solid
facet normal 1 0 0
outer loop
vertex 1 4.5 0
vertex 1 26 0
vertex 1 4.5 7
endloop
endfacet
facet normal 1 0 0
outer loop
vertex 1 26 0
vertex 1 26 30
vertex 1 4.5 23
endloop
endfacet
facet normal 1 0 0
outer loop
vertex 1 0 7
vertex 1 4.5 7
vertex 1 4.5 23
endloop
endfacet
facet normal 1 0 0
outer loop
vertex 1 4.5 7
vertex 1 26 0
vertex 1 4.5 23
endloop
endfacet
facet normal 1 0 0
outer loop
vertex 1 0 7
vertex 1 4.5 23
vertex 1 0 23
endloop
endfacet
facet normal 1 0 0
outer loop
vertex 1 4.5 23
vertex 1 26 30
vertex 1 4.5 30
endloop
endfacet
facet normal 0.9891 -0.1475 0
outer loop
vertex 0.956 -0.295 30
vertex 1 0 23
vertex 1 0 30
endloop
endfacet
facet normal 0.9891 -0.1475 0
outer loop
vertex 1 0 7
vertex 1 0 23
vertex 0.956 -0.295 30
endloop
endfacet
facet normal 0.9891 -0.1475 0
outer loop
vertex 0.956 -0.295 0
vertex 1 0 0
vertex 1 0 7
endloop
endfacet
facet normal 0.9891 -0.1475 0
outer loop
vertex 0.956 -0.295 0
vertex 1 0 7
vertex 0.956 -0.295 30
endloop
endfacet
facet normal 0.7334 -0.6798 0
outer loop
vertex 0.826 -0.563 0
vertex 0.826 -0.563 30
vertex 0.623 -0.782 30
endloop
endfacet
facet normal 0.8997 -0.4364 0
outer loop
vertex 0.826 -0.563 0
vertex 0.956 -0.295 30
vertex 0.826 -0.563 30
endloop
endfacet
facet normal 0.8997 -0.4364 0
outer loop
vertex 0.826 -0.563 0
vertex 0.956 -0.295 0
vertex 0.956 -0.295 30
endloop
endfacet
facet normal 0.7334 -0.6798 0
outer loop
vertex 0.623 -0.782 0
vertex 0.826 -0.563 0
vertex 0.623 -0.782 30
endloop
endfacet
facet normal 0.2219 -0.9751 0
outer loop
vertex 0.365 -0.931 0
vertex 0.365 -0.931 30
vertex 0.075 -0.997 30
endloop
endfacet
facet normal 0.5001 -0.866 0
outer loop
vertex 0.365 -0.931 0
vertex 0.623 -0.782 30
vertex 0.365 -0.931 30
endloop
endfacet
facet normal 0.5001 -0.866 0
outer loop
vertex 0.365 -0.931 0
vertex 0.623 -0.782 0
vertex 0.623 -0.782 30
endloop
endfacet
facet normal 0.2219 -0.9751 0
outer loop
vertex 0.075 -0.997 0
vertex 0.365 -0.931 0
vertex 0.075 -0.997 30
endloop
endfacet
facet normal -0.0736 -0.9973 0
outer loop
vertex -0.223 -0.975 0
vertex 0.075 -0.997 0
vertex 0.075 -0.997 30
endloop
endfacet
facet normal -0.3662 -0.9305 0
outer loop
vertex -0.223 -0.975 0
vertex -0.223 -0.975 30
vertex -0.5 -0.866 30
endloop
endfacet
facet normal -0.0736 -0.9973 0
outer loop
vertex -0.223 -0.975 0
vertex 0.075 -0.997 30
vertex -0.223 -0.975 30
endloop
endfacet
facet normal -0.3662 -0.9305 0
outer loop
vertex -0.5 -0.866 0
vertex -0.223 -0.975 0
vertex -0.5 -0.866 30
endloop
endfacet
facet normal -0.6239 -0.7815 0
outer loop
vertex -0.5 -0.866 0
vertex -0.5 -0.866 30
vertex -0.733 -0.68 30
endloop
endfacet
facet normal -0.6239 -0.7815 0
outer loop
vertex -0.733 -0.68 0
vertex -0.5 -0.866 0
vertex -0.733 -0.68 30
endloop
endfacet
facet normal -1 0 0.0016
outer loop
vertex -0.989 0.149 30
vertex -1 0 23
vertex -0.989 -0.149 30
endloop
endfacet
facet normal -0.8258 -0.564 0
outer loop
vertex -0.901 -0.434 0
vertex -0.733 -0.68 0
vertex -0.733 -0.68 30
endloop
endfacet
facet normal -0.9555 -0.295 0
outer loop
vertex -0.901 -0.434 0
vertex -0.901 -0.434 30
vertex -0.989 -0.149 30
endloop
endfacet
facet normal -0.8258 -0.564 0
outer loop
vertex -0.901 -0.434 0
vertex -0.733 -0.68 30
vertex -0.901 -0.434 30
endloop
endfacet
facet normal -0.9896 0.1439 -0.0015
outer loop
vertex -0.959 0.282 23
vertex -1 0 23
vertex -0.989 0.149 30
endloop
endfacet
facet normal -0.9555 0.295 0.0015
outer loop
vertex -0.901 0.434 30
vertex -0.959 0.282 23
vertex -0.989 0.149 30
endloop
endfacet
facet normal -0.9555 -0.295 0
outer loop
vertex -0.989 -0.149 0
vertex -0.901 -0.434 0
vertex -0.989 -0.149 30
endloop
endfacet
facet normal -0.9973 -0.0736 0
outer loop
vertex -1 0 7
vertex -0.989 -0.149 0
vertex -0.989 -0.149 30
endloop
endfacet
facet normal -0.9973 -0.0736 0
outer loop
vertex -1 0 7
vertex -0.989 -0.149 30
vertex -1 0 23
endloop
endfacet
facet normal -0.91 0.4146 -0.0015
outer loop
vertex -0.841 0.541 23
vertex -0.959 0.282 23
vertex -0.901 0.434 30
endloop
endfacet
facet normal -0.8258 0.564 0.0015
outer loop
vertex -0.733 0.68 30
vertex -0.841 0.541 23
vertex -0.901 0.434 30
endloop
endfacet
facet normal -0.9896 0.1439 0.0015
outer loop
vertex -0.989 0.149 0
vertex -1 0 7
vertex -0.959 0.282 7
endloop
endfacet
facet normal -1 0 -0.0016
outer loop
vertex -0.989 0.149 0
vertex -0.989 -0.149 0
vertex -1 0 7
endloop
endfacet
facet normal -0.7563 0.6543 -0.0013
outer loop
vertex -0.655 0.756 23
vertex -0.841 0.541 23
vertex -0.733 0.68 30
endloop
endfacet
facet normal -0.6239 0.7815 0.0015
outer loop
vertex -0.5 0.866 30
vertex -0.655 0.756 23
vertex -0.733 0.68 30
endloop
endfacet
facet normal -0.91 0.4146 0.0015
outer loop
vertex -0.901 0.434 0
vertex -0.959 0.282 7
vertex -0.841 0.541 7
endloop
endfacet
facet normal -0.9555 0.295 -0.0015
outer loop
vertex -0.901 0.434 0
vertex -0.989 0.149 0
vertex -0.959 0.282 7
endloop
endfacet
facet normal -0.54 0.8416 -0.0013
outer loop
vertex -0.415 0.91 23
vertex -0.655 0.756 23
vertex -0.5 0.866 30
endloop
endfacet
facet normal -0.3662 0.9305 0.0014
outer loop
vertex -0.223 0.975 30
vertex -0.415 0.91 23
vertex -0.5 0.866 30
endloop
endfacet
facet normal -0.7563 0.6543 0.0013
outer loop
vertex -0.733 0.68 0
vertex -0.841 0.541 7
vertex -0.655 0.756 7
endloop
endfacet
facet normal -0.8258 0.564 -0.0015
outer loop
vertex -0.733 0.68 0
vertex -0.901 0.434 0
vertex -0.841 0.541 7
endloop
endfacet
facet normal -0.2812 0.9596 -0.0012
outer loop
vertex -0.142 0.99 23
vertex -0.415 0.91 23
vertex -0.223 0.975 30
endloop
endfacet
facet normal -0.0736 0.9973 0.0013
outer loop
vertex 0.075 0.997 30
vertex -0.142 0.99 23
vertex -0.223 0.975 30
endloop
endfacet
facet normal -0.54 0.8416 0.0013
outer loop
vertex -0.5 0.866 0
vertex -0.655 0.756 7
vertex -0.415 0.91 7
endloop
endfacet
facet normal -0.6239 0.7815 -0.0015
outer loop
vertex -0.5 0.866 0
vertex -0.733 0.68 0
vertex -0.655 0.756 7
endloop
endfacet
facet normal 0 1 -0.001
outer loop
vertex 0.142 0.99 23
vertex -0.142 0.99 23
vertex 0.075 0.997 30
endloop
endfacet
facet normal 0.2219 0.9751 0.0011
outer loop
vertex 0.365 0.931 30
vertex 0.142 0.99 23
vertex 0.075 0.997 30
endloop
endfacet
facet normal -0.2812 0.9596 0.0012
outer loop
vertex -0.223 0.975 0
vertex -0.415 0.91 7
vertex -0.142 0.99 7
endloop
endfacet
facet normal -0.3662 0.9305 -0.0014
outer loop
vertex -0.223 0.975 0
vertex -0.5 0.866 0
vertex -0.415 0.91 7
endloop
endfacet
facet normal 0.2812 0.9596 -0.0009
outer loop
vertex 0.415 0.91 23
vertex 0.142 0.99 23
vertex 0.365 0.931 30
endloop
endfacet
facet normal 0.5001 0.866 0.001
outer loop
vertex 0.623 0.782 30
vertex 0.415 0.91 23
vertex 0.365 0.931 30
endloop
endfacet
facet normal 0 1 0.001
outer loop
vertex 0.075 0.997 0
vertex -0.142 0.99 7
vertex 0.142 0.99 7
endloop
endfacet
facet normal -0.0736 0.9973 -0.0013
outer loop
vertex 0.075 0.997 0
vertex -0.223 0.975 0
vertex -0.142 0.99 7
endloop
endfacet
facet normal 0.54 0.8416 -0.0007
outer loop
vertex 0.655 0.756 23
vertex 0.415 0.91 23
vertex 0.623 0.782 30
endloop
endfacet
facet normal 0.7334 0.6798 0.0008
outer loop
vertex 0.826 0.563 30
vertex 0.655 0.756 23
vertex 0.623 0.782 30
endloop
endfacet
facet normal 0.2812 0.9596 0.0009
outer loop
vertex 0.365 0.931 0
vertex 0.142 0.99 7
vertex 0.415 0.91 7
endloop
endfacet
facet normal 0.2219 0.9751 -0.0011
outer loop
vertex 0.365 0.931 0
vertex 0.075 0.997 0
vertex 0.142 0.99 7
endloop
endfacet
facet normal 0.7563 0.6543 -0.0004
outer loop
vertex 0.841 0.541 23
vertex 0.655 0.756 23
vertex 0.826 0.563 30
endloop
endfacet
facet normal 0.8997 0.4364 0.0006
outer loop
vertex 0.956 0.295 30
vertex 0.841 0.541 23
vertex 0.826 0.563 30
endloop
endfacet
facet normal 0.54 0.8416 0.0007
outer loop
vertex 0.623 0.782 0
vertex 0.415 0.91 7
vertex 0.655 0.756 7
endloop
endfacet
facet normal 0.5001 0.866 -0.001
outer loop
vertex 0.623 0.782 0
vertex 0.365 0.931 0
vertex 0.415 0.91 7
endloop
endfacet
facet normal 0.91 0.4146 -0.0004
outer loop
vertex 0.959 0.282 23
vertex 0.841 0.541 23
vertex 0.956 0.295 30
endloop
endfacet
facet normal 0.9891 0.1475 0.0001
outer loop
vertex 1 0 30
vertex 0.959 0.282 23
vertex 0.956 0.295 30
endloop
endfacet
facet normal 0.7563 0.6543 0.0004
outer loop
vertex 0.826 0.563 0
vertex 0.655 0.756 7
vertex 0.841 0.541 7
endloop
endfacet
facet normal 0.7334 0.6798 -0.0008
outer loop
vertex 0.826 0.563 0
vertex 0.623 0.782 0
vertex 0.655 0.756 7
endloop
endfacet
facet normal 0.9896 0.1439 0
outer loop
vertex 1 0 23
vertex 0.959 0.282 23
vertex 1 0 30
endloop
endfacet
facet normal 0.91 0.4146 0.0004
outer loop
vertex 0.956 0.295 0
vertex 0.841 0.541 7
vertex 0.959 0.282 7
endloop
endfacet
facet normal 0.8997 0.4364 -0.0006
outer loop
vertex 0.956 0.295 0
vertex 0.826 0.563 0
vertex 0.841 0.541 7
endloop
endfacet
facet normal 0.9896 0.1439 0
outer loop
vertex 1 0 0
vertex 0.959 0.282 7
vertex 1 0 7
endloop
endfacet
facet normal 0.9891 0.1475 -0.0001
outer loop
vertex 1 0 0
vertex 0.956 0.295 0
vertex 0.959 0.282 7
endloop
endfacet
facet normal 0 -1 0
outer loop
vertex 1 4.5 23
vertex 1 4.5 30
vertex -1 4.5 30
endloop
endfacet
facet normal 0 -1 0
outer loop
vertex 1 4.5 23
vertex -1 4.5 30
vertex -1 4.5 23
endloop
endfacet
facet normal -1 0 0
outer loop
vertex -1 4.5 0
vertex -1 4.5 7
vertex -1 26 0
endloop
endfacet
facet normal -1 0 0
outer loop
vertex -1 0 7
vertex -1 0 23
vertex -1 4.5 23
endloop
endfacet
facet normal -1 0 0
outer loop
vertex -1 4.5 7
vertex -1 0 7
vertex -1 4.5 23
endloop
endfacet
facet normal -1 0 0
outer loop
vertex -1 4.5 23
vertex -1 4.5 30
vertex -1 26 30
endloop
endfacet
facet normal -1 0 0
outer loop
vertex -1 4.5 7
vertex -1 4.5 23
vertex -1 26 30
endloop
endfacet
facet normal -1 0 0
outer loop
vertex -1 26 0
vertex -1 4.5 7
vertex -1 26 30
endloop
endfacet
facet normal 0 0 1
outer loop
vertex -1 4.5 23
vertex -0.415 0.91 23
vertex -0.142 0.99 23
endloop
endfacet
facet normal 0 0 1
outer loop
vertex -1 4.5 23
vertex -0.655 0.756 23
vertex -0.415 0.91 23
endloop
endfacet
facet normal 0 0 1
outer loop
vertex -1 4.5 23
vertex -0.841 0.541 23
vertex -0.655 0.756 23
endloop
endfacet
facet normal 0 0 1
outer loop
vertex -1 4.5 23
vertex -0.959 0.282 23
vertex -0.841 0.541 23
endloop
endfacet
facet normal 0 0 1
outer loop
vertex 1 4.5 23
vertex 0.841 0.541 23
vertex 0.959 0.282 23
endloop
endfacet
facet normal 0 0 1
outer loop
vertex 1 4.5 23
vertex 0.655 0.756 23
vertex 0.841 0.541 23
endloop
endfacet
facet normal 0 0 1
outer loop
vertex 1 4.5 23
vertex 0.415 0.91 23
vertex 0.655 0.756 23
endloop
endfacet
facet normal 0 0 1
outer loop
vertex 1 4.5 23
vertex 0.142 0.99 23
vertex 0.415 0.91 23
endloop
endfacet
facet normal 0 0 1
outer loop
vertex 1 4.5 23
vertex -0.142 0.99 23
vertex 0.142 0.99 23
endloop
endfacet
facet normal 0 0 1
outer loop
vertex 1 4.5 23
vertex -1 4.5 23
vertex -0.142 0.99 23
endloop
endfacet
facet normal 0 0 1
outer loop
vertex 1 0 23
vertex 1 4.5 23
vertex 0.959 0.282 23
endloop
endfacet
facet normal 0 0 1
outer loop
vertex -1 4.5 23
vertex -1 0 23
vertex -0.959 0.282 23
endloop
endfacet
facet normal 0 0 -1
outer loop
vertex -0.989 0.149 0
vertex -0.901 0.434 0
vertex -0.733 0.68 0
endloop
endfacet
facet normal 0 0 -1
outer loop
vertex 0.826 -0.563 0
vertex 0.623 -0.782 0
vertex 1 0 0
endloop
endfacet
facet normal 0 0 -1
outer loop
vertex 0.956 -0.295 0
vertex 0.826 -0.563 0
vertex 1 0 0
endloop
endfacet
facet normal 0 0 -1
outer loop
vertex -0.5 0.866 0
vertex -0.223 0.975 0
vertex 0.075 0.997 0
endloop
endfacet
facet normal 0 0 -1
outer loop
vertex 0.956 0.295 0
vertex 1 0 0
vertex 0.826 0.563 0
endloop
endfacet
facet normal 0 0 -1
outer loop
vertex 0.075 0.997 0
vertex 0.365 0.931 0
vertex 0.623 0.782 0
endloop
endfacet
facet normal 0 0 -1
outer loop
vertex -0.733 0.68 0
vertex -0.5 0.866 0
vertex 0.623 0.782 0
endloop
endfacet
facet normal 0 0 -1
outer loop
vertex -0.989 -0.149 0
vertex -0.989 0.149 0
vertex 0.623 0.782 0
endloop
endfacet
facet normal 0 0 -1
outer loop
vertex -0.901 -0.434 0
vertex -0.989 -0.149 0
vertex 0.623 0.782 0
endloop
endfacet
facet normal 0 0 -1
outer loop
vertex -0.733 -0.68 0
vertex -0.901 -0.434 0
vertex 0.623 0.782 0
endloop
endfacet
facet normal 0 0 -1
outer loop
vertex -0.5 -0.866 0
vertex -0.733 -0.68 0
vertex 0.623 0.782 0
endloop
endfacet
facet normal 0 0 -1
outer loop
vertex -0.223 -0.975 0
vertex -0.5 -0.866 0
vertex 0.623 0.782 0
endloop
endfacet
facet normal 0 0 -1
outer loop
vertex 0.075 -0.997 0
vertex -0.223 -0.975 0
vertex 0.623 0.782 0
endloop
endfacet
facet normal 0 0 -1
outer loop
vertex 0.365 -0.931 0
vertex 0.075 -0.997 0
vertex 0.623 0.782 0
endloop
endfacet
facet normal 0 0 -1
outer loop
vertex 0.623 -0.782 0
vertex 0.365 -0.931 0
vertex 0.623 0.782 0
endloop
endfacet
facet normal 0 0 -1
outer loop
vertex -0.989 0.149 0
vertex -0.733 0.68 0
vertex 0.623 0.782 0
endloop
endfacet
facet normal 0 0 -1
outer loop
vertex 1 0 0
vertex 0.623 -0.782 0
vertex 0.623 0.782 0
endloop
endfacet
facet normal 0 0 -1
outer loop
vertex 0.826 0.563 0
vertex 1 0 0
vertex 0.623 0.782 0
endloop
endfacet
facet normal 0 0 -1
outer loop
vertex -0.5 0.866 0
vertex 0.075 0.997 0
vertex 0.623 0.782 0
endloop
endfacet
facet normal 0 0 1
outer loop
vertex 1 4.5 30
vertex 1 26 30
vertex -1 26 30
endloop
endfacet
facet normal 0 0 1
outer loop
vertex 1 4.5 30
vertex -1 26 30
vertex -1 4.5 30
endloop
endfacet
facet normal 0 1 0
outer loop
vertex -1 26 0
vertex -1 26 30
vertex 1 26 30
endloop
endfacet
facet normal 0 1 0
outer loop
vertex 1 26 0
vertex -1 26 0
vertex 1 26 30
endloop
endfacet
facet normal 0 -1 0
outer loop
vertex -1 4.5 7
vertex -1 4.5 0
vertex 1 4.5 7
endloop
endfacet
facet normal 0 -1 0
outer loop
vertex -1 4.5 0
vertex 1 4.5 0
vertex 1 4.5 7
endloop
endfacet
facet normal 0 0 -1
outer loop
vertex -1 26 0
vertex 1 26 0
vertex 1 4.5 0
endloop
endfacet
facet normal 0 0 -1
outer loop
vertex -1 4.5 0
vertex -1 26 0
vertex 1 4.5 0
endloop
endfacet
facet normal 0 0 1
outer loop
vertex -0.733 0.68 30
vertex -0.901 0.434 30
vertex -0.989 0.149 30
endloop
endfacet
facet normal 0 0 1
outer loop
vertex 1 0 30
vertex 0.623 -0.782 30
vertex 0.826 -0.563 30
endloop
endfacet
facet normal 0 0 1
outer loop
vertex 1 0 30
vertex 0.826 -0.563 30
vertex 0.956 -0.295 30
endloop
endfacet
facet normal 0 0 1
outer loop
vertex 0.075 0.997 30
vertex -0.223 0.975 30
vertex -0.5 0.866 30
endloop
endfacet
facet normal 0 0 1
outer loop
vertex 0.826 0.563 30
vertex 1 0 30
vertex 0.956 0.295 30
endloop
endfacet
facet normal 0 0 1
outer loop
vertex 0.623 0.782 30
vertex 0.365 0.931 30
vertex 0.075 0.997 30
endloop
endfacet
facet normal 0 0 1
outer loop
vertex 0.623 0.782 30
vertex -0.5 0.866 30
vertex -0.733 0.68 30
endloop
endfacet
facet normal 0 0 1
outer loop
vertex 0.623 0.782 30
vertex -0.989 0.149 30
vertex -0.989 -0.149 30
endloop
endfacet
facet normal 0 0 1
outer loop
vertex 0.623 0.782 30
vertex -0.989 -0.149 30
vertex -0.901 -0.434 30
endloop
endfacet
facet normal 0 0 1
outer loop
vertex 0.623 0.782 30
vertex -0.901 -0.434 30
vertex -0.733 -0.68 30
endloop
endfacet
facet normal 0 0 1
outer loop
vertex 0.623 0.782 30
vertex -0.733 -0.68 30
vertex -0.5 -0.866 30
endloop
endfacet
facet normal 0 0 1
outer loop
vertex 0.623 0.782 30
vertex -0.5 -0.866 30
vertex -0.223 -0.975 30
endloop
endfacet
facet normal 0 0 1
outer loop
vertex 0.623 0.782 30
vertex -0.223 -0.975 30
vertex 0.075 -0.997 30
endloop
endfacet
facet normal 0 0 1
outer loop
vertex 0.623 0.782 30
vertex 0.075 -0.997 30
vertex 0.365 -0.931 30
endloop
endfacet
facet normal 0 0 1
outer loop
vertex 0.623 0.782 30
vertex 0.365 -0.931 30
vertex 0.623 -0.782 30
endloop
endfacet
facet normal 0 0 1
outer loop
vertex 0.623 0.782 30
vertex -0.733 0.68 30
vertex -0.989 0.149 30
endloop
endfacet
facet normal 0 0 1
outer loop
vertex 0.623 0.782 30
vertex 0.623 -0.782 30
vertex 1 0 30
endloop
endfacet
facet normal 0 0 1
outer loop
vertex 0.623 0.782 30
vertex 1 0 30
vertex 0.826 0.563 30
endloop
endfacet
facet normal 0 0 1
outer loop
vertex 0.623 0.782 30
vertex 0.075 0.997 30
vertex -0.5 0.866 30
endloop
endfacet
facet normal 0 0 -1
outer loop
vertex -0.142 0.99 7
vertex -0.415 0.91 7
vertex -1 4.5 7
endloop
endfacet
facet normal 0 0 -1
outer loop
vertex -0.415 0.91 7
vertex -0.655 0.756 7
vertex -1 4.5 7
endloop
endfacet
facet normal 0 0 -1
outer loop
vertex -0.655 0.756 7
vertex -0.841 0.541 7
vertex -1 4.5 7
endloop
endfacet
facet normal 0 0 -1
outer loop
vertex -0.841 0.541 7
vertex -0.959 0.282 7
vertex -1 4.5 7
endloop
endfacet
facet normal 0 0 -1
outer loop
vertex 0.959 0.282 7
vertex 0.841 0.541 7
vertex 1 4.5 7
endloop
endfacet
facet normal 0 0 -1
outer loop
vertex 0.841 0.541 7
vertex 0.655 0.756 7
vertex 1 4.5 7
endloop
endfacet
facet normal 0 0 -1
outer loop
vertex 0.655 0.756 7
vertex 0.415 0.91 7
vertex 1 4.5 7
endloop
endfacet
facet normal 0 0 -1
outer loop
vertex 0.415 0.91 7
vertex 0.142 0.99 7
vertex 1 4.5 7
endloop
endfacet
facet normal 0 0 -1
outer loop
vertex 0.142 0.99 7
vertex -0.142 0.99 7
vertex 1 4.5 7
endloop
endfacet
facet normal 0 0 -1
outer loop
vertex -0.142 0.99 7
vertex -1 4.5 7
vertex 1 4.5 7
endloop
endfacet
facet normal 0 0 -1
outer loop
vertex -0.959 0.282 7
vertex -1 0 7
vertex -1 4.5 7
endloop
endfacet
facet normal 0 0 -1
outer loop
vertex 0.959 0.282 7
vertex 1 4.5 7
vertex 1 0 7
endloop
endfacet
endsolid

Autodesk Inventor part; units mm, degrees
ref_plane "YZ Plane" through (0, 0, 0) normal (1, 0, 0) x (0, 1, 0)
ref_plane "XZ Plane" through (0, 0, 0) normal (0, 1, 0) x (-1, 0, 0)
ref_plane "XY Plane" through (0, 0, 0) normal (0, 0, 1) x (1, 0, 0)
sketch "Sketch1" plane through (0, 0, 0) normal (0, 0, 1) x (1, 0, 0)
  circle A0 centre (0, 0) radius 1
  dimension "d0" = 2
extrude "Extrusion1" add sketch "Sketch1" along normal blind 30
ref_plane "Work Plane1" through (0, 0, 23) normal (0, 0, 1) x (1, 0, 0)
ref_plane "Work Plane2" through (0, 0, 7) normal (0, 0, -1) x (-1, 0, 0)
sketch "Sketch2" plane through (0, 0, 23) normal (0, 0, 1) x (1, 0, 0)
  circle A0 centre (0, 0) radius 1 projected
  line L0 (1, 0) -> (-1, 0)
  line L1 (-1, 0) -> (-1, 26)
  line L2 (-1, 26) -> (1, 26)
  line L3 (1, 26) -> (1, 0)
  dimension "d7" = 26
extrude "Extrusion2" add sketch "Sketch2" against normal up to surface (16 mm away) contours A0 L1 L2 L3
sketch "Sketch3" plane through (1, 0, 23) normal (1, 0, 0) x (0, 0, -1)
  line L0 (16, 0) -> (16, 26) projected
  line L1 (0, 26) -> (16, 26) projected
  line L2 (0, 0) -> (0, 26) projected
  line L3 (16, 0) -> (0, 0) projected
  line L4 (0, 26) -> (-7, 26)
  line L5 (-7, 26) -> (-7, 4.5)
  line L6 (-7, 4.5) -> (0, 4.5)
  line L7 (0, 4.5) -> (0, 26)
  line L8 (16, 0) -> (16, 26) projected
  line L9 (16, 26) -> (23, 26)
  line L10 (23, 26) -> (23, 4.5)
  line L11 (23, 4.5) -> (16, 4.5)
  line L12 (16, 4.5) -> (16, 26)
  line L13 (23, -1) -> (23, 1) projected
  line L14 (-7, 1) -> (-7, -1) projected
  line L15 (16, 0) -> (0, 0) projected
  line L16 (16, 0) -> (16, 0) projected
  line L17 (16, 0) -> (0, 0) projected
  line L18 (0, 0) -> (0, 0) projected
  point P0 (23, 0)
  point P1 (19.5, 4.5)
  point P2 (-3.5, 4.5)
  point P3 (23, 0)
  point P4 (23, 15.25)
  point P5 (-7, 15.25)
  point P6 (-7, 0)
  dimension "d10" = 3.5
extrude "Extrusion3" add sketch "Sketch3" against normal up to surface (2 mm away) contours L0 L9 L10 L11 | L6 L5 L4 L2
properties part number "gpsDoor"
